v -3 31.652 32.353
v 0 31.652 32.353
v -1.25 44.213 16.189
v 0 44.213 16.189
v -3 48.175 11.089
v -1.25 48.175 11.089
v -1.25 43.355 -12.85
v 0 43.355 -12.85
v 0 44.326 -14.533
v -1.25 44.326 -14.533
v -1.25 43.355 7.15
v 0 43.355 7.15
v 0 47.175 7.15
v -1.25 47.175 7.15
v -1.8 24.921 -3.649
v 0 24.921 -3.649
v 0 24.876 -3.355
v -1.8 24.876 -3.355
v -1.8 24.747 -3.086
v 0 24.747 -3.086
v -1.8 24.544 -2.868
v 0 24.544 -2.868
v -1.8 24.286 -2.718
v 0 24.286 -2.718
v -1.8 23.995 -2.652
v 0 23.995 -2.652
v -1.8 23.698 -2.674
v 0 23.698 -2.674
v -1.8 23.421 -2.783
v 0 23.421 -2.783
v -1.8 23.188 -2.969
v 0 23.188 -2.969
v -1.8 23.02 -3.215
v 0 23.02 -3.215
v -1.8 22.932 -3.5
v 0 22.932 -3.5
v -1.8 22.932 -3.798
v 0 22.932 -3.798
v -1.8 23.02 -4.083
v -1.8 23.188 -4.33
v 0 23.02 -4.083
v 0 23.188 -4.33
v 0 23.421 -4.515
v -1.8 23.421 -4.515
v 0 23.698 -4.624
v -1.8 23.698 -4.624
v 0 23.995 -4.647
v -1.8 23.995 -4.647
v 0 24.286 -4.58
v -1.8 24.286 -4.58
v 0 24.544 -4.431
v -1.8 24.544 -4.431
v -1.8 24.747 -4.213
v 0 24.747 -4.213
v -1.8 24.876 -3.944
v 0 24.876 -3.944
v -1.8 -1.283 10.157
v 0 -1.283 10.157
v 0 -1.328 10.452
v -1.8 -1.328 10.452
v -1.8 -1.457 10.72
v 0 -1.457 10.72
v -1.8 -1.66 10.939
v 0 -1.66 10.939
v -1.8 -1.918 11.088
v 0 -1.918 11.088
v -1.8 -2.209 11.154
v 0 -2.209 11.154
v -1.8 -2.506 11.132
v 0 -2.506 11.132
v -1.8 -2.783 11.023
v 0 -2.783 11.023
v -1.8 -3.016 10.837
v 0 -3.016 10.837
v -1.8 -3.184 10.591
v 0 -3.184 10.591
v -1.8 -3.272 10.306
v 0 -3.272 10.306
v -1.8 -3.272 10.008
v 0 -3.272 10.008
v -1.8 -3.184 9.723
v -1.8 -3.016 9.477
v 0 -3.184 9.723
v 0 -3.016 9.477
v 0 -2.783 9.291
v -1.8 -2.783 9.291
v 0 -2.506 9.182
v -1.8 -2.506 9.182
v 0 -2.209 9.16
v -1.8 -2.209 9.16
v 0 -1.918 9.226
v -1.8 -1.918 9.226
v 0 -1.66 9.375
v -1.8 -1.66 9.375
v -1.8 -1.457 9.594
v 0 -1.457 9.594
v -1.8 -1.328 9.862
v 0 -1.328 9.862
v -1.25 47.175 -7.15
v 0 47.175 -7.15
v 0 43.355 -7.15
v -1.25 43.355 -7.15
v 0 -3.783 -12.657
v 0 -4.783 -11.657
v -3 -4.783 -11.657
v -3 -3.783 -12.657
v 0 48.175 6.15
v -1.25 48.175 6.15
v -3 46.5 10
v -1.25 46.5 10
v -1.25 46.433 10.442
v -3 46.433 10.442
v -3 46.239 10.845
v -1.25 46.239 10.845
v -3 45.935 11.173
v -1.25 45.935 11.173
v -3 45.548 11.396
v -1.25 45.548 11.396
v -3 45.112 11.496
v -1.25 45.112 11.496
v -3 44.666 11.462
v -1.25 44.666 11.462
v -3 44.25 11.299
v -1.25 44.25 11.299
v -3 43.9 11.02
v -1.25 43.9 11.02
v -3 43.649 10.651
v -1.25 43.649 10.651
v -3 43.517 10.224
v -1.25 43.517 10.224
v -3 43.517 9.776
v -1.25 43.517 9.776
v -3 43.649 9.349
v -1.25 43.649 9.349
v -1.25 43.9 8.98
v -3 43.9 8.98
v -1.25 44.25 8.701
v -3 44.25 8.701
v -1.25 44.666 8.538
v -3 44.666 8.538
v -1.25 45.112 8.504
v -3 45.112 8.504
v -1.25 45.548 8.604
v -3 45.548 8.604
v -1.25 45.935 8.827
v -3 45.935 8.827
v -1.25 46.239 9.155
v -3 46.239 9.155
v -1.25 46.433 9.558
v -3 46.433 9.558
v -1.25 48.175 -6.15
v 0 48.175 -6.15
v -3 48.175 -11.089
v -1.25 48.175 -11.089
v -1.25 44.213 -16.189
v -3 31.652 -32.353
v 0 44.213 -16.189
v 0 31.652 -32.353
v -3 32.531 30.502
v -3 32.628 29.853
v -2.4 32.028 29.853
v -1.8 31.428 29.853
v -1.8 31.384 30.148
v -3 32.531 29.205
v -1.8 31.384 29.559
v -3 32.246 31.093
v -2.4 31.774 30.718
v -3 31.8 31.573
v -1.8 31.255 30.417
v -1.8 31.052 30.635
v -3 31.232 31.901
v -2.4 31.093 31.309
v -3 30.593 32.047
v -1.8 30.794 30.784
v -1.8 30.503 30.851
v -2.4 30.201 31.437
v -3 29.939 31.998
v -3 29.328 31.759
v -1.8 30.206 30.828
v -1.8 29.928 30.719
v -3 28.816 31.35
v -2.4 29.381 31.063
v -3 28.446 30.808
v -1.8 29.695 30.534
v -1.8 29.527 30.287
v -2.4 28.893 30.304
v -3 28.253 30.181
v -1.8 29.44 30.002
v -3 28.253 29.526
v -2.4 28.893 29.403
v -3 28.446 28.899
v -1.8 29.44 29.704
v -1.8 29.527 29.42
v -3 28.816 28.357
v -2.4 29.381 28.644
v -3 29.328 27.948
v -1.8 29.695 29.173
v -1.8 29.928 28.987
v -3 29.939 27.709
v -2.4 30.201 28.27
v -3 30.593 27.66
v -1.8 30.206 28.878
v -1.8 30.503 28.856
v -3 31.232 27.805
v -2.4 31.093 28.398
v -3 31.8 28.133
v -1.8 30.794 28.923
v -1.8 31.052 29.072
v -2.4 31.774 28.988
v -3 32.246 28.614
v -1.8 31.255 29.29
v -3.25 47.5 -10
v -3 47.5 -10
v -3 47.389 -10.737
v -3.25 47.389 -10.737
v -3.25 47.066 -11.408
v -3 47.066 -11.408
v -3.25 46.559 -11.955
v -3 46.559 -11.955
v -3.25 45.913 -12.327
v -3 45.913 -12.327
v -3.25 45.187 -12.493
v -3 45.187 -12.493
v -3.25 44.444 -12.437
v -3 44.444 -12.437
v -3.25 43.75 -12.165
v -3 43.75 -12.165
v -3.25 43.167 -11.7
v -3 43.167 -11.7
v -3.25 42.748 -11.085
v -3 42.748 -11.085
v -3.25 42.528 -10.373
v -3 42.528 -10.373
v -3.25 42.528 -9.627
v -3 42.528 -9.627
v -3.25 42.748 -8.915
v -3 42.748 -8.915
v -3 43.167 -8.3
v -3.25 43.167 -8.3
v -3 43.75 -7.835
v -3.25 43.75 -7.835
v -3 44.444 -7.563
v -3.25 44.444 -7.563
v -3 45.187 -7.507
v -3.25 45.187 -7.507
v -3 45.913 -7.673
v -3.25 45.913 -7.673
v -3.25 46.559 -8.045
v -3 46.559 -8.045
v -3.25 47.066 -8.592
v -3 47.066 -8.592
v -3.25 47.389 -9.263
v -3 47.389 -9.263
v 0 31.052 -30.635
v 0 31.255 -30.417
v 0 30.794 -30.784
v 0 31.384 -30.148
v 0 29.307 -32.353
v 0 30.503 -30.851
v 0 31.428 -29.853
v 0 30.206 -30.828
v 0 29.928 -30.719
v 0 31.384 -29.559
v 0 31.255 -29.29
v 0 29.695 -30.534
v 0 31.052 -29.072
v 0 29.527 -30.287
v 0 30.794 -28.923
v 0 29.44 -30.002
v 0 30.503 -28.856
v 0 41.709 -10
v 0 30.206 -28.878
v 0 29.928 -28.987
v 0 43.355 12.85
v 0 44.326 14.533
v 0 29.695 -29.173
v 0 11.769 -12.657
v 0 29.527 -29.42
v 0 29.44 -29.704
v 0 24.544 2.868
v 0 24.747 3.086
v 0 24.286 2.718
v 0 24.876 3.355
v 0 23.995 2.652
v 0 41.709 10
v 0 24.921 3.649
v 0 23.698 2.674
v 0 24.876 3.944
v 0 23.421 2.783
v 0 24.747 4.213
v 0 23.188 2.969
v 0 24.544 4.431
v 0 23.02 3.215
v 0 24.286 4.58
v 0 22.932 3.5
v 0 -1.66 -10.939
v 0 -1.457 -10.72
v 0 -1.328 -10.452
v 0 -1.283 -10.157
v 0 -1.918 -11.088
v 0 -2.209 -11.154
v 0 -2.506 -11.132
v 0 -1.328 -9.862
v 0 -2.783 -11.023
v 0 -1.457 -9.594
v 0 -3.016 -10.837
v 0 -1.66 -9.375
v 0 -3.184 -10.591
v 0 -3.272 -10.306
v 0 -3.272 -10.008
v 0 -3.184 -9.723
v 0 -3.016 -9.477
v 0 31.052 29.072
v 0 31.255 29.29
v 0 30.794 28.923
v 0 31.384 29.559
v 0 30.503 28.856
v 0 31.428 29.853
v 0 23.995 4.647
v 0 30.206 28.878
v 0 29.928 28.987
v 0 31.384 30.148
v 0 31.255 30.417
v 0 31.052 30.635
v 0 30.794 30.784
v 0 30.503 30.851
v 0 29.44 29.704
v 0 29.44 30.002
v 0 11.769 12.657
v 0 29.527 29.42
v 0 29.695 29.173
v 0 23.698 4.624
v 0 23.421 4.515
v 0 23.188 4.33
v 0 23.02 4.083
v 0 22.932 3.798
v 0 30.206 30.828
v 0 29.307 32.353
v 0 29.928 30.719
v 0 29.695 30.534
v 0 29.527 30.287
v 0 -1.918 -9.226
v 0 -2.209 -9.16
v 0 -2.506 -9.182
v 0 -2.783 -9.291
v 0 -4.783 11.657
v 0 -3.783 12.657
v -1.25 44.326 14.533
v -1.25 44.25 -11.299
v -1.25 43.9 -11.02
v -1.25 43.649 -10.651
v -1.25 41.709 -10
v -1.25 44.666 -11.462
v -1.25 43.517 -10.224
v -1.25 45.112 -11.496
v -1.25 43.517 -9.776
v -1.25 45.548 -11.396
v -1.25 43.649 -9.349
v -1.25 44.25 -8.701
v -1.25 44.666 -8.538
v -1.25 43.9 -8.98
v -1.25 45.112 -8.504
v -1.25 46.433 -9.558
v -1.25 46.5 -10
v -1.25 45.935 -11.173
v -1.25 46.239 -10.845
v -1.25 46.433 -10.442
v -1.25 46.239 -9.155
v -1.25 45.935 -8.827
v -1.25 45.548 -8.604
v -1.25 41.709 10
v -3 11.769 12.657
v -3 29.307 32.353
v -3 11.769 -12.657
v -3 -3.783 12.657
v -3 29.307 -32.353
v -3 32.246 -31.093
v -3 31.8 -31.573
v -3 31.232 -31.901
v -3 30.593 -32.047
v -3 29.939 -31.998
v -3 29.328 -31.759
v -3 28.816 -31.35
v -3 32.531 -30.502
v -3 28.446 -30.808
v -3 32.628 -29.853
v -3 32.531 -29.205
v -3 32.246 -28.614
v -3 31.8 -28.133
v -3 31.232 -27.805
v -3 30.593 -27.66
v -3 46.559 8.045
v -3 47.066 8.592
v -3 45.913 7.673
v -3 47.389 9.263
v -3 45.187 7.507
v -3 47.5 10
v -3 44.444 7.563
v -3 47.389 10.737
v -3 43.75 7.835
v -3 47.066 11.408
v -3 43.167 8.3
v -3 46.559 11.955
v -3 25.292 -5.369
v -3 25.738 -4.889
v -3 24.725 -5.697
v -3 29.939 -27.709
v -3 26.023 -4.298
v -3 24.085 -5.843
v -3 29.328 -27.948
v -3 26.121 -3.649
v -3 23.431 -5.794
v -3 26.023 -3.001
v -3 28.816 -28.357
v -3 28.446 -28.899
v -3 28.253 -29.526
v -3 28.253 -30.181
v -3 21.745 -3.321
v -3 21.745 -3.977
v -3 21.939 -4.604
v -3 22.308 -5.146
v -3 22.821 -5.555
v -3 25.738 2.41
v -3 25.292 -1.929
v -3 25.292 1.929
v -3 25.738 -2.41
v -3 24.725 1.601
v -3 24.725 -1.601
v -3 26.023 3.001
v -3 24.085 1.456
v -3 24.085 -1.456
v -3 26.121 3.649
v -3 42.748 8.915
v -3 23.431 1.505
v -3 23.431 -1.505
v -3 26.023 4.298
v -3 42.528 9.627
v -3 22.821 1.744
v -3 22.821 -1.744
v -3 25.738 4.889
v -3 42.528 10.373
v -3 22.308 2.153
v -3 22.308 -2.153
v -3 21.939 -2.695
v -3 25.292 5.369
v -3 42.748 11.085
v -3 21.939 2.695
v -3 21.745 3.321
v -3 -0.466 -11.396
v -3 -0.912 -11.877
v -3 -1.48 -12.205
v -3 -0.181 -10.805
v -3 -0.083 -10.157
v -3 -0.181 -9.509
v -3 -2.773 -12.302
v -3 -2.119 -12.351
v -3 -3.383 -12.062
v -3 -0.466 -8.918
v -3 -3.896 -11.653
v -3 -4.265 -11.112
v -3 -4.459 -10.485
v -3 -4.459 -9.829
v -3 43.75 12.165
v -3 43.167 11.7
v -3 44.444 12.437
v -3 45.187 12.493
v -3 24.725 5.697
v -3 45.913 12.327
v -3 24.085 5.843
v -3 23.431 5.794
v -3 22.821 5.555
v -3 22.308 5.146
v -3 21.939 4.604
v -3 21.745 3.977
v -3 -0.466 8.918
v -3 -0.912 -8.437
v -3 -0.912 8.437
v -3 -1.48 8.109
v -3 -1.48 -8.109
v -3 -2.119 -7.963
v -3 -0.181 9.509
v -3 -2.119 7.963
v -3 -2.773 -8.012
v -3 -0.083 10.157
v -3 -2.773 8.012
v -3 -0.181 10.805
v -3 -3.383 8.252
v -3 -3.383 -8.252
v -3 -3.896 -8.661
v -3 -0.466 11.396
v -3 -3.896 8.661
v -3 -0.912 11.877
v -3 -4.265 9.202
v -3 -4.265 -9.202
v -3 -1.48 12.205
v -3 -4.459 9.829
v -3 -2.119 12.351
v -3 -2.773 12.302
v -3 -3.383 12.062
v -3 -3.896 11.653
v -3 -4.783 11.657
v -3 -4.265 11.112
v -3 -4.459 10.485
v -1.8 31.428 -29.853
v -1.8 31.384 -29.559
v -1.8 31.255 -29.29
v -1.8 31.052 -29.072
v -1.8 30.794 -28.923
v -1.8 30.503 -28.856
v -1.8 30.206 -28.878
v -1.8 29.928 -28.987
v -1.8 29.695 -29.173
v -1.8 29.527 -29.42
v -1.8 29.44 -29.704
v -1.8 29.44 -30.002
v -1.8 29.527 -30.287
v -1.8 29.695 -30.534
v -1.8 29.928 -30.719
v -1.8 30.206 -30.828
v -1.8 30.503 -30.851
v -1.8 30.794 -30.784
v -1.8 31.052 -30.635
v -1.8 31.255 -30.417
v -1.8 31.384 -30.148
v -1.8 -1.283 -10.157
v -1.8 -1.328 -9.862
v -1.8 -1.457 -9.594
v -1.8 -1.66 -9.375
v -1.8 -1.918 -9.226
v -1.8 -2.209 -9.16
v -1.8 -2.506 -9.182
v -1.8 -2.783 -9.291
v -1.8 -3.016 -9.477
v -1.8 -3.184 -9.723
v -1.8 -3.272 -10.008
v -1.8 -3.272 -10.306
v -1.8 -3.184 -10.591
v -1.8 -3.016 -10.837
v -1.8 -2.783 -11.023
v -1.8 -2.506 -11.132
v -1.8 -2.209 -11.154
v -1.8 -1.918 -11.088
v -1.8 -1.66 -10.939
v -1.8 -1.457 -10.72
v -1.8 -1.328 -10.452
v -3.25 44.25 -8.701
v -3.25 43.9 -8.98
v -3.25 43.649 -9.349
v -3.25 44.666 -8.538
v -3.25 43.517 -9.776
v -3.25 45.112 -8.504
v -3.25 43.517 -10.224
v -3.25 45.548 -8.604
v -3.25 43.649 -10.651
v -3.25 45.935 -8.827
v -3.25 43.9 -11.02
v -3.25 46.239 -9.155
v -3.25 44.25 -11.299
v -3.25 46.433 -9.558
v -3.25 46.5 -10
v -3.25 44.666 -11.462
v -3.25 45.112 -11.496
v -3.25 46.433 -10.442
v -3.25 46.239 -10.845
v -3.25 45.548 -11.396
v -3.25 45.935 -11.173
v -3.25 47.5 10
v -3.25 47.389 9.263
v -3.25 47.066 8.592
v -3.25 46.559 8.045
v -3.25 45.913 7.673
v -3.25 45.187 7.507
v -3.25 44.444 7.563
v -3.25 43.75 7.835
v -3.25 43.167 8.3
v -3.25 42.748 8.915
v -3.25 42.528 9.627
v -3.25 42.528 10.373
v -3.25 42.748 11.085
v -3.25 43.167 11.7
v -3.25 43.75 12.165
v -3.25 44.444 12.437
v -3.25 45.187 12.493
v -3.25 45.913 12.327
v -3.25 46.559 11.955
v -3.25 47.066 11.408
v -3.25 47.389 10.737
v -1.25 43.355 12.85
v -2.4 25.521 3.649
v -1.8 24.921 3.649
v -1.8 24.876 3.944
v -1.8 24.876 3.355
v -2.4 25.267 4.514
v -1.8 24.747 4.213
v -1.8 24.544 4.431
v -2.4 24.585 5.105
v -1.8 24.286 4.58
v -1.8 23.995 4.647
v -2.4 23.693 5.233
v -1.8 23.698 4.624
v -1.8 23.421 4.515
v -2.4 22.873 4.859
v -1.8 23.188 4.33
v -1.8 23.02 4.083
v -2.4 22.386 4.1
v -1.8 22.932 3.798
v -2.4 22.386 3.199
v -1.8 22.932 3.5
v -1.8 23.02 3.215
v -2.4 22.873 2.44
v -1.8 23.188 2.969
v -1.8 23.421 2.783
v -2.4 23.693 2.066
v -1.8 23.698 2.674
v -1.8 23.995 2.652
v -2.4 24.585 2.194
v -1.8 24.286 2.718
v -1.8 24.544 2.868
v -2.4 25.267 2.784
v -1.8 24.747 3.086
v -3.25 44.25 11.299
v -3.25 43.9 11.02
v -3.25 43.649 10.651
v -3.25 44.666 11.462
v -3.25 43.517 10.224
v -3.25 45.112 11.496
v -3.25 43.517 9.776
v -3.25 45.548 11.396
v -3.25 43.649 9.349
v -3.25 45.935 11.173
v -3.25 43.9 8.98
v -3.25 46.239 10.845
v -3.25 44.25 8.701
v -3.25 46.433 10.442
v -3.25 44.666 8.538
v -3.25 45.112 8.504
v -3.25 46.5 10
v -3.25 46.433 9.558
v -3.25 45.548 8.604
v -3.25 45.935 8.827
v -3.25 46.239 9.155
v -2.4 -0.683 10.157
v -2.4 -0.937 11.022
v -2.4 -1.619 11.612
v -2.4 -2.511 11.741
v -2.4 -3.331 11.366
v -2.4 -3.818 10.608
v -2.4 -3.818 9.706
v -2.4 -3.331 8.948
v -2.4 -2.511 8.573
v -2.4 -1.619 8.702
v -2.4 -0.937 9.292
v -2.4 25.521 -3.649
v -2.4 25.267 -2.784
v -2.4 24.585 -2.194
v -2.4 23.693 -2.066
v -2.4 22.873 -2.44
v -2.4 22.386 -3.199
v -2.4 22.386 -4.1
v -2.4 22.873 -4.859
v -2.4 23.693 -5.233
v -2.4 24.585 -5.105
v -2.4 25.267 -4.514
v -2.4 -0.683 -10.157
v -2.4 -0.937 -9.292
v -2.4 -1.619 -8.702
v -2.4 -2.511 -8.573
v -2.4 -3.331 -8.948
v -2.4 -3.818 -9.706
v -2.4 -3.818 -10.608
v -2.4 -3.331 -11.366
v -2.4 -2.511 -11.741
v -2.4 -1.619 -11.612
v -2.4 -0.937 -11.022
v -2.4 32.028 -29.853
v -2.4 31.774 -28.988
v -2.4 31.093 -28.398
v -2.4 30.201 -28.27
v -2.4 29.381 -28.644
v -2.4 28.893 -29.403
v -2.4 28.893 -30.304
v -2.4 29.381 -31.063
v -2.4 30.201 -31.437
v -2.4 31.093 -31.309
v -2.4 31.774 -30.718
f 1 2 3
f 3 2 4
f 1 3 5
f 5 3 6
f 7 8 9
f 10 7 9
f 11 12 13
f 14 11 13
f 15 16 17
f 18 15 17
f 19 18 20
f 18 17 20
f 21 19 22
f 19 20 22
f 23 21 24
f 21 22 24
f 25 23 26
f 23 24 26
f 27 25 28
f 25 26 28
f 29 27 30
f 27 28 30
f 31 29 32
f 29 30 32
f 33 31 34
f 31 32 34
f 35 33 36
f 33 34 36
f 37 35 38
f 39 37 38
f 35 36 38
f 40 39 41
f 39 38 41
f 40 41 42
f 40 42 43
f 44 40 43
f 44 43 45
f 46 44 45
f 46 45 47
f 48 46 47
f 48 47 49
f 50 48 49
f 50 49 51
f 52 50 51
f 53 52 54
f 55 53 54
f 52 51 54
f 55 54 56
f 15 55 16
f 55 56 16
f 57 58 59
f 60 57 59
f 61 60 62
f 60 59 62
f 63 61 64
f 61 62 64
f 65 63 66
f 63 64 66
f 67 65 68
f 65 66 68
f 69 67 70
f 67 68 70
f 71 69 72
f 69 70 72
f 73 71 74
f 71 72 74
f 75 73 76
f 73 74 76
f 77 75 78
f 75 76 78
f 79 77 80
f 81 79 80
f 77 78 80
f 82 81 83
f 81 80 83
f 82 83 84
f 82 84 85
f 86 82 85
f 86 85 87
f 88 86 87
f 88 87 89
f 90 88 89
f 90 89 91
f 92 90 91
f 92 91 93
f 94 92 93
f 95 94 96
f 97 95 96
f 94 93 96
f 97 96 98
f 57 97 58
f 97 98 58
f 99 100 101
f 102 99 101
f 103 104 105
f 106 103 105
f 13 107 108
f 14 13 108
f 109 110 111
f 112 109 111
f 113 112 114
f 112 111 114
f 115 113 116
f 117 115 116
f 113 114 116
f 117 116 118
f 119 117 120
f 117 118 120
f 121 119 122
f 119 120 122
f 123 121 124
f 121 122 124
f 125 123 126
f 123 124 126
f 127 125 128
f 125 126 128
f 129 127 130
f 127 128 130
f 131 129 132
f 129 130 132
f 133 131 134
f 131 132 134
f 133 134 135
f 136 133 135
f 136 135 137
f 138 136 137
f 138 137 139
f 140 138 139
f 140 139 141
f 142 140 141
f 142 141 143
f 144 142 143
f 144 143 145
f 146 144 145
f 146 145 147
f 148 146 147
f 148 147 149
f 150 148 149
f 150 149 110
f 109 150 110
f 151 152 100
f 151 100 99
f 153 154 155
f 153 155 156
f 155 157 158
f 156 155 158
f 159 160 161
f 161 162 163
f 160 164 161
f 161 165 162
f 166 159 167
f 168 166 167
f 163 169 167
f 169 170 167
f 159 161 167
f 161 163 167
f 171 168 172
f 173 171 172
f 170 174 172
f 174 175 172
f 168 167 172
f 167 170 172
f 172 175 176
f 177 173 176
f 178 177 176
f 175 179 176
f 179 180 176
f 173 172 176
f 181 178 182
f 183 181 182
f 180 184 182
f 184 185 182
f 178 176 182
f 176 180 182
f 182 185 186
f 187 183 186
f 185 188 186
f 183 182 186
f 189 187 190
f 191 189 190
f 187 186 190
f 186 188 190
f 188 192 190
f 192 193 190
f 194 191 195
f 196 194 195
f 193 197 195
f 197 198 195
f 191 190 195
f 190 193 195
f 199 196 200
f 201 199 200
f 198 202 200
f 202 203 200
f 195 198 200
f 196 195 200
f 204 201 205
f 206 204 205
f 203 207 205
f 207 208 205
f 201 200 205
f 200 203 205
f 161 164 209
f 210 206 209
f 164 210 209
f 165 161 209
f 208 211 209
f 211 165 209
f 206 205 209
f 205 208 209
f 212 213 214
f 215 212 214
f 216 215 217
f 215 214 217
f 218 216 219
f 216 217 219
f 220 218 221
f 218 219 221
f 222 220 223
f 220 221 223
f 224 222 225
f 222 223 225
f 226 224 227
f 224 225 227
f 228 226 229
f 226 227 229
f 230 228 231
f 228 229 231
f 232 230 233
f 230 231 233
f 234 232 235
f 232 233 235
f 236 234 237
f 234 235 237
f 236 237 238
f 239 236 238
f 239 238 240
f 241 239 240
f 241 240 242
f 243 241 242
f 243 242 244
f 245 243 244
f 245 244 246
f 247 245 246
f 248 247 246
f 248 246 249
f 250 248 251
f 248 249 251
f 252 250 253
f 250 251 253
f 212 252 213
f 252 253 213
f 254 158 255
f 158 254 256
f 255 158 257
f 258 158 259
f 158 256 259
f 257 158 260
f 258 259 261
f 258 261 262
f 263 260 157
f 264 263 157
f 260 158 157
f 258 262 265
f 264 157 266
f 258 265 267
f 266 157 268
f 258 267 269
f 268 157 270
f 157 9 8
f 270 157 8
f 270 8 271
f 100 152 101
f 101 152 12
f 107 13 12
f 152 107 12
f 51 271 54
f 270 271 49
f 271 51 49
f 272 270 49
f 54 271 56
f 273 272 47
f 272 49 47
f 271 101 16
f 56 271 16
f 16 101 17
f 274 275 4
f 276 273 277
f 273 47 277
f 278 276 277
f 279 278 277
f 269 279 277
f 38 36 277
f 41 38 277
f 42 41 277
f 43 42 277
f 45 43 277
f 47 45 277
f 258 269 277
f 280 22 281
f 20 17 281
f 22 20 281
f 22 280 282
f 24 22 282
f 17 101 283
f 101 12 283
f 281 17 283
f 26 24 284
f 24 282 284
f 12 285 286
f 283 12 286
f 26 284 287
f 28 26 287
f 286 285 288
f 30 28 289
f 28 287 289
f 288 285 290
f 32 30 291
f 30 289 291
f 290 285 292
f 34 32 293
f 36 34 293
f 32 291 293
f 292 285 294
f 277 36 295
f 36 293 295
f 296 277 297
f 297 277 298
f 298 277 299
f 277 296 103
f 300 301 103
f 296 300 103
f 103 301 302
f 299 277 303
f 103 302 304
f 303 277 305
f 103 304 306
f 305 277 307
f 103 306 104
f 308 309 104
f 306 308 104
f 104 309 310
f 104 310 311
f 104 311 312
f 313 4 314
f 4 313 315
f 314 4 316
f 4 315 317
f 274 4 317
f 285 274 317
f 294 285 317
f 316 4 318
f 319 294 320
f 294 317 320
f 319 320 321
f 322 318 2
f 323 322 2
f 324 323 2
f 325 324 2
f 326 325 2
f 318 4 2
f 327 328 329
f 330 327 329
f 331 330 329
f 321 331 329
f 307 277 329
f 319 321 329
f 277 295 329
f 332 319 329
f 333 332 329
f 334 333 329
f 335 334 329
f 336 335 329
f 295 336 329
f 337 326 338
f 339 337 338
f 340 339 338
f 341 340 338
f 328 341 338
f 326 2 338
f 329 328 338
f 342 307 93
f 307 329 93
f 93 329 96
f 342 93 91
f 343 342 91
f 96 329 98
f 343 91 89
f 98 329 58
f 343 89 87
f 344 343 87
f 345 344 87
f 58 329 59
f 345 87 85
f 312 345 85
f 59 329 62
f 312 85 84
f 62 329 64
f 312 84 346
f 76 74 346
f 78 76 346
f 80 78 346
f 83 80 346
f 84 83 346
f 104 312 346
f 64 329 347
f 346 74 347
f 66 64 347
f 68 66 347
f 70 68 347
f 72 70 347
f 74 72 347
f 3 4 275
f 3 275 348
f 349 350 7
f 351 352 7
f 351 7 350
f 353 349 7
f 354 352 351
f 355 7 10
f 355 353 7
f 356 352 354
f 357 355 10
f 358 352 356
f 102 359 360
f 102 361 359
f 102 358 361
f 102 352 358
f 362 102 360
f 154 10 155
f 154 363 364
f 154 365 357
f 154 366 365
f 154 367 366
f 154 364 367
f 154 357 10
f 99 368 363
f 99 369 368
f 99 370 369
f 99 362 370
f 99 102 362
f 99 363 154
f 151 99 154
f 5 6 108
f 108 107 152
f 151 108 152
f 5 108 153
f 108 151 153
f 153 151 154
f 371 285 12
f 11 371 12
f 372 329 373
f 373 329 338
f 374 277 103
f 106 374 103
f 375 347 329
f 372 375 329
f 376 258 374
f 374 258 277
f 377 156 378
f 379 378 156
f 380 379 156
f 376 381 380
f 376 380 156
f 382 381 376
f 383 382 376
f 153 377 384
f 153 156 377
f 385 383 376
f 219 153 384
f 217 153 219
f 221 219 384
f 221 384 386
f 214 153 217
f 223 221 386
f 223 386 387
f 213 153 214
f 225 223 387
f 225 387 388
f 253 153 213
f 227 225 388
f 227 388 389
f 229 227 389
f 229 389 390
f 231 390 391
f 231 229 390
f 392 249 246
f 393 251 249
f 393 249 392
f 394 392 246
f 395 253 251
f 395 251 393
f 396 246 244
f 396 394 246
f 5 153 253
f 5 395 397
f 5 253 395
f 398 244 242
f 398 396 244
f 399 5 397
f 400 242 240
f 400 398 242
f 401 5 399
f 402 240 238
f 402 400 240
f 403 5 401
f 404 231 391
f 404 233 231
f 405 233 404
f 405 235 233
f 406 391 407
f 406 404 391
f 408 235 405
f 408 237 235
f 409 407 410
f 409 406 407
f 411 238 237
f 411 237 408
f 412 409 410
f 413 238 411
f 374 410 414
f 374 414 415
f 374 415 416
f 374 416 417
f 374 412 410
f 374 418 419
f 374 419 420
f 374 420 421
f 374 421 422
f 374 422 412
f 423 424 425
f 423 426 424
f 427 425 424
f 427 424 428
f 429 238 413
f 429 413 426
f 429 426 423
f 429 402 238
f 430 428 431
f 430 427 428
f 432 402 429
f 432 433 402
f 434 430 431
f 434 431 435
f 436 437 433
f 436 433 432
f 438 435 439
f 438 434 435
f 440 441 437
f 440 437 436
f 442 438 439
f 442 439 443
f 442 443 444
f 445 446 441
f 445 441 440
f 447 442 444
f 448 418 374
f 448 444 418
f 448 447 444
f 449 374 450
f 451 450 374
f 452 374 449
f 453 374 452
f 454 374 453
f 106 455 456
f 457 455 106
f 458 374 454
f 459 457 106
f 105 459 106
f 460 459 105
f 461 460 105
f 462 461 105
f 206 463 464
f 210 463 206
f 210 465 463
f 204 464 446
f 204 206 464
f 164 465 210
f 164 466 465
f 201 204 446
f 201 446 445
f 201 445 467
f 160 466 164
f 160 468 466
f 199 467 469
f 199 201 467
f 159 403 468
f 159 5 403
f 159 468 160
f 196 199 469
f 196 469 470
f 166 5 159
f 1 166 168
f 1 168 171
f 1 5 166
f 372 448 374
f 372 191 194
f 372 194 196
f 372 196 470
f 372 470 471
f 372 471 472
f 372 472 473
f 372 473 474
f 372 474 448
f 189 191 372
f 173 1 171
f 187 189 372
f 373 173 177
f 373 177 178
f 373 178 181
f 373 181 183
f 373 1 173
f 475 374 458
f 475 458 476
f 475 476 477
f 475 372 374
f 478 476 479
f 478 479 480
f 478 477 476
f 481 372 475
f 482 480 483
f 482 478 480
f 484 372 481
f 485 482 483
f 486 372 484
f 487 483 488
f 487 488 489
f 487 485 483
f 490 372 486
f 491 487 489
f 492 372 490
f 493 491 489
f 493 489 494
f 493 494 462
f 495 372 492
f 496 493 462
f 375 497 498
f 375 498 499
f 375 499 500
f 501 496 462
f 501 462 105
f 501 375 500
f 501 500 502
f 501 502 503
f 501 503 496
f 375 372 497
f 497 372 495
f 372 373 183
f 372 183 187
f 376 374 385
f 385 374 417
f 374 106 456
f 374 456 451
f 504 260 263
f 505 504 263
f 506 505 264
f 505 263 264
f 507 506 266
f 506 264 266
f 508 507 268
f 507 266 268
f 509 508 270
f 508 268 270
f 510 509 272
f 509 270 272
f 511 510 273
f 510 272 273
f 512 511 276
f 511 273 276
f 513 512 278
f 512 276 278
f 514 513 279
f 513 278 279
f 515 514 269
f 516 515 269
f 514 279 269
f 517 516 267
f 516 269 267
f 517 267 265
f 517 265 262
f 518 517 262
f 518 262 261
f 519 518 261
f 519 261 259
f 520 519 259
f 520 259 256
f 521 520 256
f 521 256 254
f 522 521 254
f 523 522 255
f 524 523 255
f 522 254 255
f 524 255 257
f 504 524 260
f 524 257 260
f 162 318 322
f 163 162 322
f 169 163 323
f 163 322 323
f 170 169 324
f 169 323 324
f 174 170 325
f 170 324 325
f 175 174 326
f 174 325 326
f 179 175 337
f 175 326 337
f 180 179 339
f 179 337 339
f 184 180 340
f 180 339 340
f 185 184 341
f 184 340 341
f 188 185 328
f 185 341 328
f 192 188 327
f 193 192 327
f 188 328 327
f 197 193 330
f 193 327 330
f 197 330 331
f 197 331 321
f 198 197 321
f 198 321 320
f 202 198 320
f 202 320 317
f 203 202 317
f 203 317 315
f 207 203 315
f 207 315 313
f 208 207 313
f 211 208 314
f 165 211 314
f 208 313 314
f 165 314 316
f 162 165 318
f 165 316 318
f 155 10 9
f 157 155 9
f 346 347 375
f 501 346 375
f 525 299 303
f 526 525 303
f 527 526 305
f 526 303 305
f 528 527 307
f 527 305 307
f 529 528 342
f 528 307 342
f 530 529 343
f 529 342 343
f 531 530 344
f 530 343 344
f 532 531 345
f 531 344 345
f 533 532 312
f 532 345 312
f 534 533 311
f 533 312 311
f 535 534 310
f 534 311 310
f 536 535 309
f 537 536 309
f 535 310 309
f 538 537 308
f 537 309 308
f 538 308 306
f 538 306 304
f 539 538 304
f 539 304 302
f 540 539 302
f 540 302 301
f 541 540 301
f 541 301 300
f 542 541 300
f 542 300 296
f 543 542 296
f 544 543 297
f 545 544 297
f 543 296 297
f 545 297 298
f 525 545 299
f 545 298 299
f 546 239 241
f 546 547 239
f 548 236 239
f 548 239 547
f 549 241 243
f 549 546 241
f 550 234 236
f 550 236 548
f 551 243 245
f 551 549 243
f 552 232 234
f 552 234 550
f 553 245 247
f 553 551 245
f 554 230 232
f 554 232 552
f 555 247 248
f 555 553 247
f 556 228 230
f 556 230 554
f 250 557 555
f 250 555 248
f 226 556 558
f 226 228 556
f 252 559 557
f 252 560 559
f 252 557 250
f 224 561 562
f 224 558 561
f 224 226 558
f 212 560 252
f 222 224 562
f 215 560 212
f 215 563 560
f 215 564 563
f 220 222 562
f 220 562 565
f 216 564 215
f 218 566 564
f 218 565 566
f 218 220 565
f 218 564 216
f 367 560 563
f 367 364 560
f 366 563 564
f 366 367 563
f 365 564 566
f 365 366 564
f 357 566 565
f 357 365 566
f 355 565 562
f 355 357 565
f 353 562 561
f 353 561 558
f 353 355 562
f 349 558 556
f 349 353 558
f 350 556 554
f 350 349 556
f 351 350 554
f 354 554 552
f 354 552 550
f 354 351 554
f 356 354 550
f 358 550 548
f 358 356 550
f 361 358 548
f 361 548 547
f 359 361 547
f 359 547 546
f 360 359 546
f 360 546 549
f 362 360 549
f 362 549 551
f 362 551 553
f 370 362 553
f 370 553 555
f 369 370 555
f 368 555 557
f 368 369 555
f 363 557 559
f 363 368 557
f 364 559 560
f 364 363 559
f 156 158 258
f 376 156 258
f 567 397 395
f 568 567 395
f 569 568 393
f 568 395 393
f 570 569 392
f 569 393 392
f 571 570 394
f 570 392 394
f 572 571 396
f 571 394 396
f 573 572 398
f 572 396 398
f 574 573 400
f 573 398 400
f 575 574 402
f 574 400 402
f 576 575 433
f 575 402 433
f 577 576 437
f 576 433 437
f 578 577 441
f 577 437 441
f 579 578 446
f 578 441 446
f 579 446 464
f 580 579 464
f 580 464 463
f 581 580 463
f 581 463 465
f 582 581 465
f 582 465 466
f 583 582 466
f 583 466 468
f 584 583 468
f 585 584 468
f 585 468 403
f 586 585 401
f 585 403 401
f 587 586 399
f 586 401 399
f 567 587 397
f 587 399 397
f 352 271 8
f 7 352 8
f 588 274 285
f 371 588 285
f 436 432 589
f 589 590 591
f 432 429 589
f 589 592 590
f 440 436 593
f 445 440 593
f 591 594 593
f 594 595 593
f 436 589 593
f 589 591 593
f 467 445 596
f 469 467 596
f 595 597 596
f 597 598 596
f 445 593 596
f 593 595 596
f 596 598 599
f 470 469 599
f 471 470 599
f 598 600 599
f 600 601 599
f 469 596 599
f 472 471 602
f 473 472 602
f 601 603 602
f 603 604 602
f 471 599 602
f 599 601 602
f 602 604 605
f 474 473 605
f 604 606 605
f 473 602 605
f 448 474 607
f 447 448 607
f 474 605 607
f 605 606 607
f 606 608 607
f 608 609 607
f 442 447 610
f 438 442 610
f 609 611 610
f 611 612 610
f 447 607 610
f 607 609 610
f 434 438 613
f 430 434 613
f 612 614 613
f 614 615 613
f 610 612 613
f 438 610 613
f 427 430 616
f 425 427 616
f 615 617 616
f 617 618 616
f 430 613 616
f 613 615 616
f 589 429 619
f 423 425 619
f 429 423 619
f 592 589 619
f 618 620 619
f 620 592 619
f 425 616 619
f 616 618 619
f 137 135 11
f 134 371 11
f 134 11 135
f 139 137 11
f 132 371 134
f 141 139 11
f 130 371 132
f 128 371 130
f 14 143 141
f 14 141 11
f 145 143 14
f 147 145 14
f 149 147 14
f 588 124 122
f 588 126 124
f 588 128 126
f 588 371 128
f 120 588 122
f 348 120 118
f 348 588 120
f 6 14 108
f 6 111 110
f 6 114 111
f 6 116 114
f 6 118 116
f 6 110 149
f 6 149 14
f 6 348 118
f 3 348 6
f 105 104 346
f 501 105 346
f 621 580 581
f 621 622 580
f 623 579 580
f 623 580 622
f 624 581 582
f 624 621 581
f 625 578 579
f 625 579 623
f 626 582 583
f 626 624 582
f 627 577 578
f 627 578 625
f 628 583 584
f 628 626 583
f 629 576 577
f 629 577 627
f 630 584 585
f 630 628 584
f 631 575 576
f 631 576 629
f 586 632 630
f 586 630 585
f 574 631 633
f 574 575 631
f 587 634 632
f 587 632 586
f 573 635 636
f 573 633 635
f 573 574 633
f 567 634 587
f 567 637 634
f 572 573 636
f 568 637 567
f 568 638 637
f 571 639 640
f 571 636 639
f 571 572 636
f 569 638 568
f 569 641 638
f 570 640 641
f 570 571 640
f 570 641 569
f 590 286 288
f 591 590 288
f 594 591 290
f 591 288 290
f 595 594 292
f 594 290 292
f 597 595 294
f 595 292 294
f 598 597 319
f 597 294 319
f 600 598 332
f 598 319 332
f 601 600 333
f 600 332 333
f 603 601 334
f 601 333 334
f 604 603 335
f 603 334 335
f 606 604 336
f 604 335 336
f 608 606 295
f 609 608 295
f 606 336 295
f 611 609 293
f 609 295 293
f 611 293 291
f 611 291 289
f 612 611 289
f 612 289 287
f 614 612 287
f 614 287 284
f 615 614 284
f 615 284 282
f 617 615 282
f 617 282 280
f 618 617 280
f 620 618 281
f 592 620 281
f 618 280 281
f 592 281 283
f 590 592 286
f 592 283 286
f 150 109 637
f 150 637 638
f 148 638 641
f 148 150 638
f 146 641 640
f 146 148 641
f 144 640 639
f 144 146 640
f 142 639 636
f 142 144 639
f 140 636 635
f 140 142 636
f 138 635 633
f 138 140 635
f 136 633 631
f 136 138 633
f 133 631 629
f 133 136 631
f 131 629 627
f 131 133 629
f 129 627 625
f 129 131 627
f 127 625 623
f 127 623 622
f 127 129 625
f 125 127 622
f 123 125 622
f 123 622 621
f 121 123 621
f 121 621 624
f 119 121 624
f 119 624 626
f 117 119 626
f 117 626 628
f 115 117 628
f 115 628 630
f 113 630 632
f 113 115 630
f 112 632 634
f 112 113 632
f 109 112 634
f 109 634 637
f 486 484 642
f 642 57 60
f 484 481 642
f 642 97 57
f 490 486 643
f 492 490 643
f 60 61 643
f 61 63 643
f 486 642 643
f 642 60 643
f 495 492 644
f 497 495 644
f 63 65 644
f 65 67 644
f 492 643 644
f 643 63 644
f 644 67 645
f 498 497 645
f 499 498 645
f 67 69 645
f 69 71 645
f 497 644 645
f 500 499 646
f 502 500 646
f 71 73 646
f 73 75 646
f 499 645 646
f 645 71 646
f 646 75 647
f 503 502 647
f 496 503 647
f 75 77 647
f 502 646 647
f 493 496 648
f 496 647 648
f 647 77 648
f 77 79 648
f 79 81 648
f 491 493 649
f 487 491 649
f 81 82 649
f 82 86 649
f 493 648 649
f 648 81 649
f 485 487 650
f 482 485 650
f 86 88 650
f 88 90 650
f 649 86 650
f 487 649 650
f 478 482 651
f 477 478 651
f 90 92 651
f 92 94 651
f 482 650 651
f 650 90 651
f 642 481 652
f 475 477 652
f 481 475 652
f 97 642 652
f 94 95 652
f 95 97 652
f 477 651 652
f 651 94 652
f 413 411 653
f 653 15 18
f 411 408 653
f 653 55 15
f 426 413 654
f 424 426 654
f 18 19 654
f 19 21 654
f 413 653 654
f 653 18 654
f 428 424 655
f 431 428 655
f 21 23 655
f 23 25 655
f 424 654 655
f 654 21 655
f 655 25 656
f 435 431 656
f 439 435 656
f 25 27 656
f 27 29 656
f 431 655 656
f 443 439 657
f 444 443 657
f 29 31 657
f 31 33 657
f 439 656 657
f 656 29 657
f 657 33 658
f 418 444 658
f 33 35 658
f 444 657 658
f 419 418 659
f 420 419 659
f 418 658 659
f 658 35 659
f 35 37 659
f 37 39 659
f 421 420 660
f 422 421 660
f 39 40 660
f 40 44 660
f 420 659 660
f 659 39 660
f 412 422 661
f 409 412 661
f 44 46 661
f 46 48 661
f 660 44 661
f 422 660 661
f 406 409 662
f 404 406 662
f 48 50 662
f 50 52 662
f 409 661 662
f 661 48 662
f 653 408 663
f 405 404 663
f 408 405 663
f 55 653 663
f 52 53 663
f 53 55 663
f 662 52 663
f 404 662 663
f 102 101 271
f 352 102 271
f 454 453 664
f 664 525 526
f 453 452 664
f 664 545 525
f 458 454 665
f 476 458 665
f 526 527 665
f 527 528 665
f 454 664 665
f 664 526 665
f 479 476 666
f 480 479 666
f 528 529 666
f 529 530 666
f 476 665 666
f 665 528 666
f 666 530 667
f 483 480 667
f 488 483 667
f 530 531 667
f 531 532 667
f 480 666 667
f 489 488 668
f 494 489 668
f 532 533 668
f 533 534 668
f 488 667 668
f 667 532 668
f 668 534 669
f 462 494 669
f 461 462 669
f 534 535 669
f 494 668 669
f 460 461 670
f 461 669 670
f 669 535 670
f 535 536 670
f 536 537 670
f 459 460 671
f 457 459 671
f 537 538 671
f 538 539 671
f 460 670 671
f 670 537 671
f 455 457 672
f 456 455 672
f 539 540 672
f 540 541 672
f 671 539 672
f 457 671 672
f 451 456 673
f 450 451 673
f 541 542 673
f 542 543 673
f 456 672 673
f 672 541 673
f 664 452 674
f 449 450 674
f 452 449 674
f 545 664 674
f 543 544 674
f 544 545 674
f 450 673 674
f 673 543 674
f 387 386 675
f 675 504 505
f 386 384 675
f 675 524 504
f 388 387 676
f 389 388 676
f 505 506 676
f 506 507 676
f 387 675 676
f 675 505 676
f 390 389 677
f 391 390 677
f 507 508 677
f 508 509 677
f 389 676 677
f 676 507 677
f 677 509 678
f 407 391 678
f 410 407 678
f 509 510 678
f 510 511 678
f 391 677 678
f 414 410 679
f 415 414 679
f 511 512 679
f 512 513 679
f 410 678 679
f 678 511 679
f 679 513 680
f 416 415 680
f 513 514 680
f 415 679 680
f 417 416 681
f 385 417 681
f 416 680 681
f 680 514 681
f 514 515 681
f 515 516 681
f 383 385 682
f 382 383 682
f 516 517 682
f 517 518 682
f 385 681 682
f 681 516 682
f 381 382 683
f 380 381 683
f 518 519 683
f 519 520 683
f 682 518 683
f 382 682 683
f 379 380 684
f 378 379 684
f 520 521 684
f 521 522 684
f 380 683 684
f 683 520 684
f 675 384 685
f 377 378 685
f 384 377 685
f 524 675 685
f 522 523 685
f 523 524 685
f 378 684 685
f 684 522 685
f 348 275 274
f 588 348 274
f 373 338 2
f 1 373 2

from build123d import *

# Parameters (mm, degrees)
SKETCH_R        = 1
SKETCH_R_2      = 1.5
PAD_DEPTH       = 3
POCKET_DEPTH    = 1.25
SKETCH002_R     = 2.5
SKETCH002_R_2   = 1.5
PAD001_DEPTH    = 0.25
CHAMFER_SIZE    = 1
CHAMFER001_SIZE = 1.2


with BuildPart() as part:
    # Sketch → Pad (new body)
    with BuildSketch(Plane.YZ):
        Polygon((48.175426, 11.088705), (48.175426, -11.088705), (31.651763, -32.353395), (29.306974, -32.353395), (11.768704, -12.656963), (-4.783279, -12.656963), (-4.783279, 12.656963), (11.768704, 12.656963), (29.306974, 32.353395), (31.651763, 32.353395), align=None)
        with Locations((-2.283279, 10.156963)):
            Circle(SKETCH_R, mode=Mode.SUBTRACT)
        with Locations((23.920751, 3.649365)):
            Circle(SKETCH_R, mode=Mode.SUBTRACT)
        with Locations((30.428348, 29.853395)):
            Circle(SKETCH_R, mode=Mode.SUBTRACT)
        with Locations((-2.283279, -10.156963)):
            Circle(SKETCH_R, mode=Mode.SUBTRACT)
        with Locations((30.428348, -29.853395)):
            Circle(SKETCH_R, mode=Mode.SUBTRACT)
        with Locations((23.920751, -3.649365)):
            Circle(SKETCH_R, mode=Mode.SUBTRACT)
        with Locations((45, 10)):
            Circle(SKETCH_R_2, mode=Mode.SUBTRACT)
        with Locations((45, -10)):
            Circle(SKETCH_R_2, mode=Mode.SUBTRACT)
    extrude(amount=-PAD_DEPTH)

    # Sketch001 (on Face19 of Pad) → Pocket (cut)
    with BuildSketch(Plane.YZ):
        Polygon((43.354552, 12.85), (41.709103, 10), (43.354552, 7.15), (46.645448, 7.15), (48.175426, 7.15), (48.175426, 11.088705), (44.826178, 15.398932), align=None)
        Polygon((43.354552, -7.15), (41.709103, -10), (43.354552, -12.85), (44.826178, -15.398932), (48.175426, -11.088705), (48.175426, -7.15), (46.645448, -7.15), align=None)
    extrude(amount=-POCKET_DEPTH, mode=Mode.SUBTRACT)

    # Sketch002 (on Face5 of Pocket) → Pad001 (join)
    with BuildSketch(Plane(origin=(-3, 0, 0), x_dir=(0, 1, 0), z_dir=(-1, 0, 0))):
        with Locations((45, 10)):
            Circle(SKETCH002_R)
        with Locations((45, 10)):
            Circle(SKETCH002_R_2, mode=Mode.SUBTRACT)
        with Locations((45, -10)):
            Circle(SKETCH002_R)
        with Locations((45, -10)):
            Circle(SKETCH002_R_2, mode=Mode.SUBTRACT)
    extrude(amount=PAD001_DEPTH)

    # Chamfer
    chamfer_edges = [part.edges().sort_by_distance(p)[0] for p in [
        (-0.625, 44.826178, 15.398932),
        (-0.625, 48.175426, 7.15),
        (-0.625, 48.175426, -7.15),
        (-0.625, 44.826178, -15.398932),
        (-1.5, -4.783279, 12.656963),
        (-1.5, -4.783279, -12.656963),
    ]]
    chamfer(chamfer_edges, length=CHAMFER_SIZE)

    # Chamfer001
    chamfer001_edges = [part.edges().sort_by_distance(p)[0] for p in [
        (-3, 29.428348, 29.853395),
        (-3, 22.920751, 3.649365),
        (-3, 29.428348, -29.853395),
        (-3, -3.283279, -10.156963),
        (-3, -3.283279, 10.156963),
        (-3, 22.920751, -3.649365),
    ]]
    chamfer(chamfer001_edges, length=CHAMFER001_SIZE)


solid = part.part
